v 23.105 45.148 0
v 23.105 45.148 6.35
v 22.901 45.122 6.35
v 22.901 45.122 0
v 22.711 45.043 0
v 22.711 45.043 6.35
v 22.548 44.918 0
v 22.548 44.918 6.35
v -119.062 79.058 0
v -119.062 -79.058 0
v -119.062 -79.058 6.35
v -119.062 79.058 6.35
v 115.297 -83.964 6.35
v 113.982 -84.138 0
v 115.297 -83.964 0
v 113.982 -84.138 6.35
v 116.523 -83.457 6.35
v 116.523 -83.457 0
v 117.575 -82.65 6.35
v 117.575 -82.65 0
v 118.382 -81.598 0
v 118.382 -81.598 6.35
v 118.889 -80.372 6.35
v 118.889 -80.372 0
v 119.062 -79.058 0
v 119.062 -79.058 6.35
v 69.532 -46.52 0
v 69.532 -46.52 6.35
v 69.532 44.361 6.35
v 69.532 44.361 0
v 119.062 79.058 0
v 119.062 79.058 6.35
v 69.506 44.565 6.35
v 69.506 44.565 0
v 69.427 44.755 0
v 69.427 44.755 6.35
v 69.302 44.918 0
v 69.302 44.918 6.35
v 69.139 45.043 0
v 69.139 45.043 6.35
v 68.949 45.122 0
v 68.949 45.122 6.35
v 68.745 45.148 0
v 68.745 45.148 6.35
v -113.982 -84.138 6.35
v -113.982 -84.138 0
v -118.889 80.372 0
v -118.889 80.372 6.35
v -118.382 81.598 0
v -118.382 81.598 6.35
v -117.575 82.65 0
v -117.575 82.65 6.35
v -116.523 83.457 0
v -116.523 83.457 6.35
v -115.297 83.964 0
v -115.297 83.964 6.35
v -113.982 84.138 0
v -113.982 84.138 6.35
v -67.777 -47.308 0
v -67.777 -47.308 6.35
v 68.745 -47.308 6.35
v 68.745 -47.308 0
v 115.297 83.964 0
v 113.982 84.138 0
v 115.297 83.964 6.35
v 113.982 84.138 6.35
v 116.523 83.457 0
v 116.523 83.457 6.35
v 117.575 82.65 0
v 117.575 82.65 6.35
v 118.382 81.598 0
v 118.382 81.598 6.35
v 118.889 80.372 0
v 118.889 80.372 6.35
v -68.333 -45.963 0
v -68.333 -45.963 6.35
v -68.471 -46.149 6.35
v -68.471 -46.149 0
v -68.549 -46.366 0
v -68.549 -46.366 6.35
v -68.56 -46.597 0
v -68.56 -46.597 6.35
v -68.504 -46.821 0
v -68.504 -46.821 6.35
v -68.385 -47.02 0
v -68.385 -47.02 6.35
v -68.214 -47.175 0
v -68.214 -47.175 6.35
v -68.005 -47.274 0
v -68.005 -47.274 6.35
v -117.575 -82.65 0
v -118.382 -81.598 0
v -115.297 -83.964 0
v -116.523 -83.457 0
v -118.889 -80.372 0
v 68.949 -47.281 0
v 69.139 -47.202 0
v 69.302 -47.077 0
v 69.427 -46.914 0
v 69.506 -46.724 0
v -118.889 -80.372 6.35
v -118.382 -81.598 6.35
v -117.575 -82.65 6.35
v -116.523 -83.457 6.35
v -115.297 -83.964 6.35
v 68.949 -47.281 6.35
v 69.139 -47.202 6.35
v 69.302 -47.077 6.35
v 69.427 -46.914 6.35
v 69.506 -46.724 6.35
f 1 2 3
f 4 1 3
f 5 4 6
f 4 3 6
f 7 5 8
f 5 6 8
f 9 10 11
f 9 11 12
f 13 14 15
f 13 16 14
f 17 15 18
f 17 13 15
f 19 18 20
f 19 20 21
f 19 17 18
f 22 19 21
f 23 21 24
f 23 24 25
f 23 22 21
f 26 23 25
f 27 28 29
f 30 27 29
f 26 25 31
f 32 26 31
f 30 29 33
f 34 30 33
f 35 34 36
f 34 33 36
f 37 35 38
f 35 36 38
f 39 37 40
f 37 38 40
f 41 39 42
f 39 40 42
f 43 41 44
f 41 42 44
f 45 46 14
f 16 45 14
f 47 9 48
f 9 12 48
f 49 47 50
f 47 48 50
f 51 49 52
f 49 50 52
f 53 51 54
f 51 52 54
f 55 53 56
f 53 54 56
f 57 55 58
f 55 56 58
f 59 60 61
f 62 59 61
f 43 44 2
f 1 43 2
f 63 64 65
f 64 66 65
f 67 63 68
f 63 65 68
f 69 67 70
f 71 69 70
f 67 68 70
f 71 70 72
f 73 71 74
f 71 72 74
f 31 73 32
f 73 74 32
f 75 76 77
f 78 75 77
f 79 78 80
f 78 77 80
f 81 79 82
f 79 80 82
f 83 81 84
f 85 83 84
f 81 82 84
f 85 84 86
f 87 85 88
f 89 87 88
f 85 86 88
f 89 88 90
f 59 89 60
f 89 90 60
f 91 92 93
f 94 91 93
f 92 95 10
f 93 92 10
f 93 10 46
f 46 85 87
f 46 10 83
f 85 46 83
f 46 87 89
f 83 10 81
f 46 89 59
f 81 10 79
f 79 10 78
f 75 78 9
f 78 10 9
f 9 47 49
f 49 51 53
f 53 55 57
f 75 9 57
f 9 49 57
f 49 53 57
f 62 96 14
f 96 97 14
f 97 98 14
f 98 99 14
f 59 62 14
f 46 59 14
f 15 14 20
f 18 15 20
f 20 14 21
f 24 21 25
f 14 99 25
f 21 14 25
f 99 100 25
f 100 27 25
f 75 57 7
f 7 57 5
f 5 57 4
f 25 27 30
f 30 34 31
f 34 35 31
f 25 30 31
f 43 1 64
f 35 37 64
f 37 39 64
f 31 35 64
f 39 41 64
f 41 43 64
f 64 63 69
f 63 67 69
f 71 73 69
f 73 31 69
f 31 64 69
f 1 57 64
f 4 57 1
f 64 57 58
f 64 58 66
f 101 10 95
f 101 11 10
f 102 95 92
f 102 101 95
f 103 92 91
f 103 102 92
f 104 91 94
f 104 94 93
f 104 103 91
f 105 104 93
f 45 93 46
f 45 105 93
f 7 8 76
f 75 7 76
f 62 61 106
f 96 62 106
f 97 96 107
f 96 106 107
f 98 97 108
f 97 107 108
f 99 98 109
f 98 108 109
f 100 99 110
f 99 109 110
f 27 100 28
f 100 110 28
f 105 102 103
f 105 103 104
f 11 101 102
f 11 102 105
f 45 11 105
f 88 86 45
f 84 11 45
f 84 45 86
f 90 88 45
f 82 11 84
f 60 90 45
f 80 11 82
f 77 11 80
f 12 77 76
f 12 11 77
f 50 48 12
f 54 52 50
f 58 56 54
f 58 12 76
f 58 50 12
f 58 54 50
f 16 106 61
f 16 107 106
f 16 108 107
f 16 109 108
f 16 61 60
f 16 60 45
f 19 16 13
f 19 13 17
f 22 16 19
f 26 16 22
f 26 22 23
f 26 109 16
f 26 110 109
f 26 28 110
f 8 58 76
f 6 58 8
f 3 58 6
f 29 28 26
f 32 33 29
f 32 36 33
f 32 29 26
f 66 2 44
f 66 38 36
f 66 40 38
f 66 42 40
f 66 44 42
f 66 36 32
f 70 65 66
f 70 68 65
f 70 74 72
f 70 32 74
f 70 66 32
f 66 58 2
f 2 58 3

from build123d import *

# Parameters (mm, degrees)
F0_W     = 238.125
F0_H     = 168.275
F1_DEPTH = 6.35
F3_DEPTH = 25.4
F4_R     = 5.08
F5_DEPTH = 6.351
F7_DEPTH = 6.351


with BuildPart() as f1:
    # F0 (on Top) → F1 (new body)
    with BuildSketch(Plane.XY):
        Rectangle(F0_W, F0_H)
    extrude(amount=F1_DEPTH)

    # F2 (on face) → F3 (cut)
    with BuildSketch(Plane.XY.offset(6.35)):
        Polygon((23.3045, 43.8785), (-66.6115, -46.0375), (68.2625, -46.0375), (68.2625, 43.8785), align=None)
    extrude(amount=-F3_DEPTH, mode=Mode.SUBTRACT)

    # F4
    f4_edges = [f1.edges().sort_by_distance(p)[0] for p in [
        (119.0625, -84.1375, 3.175),
        (119.0625, 84.1375, 3.175),
        (-119.0625, -84.1375, 3.175),
        (-119.0625, 84.1375, 3.175),
    ]]
    fillet(f4_edges, radius=F4_R)

    # F2 (on face) → F5 (cut, through all)
    with BuildSketch(Plane.XY.offset(6.35)):
        Polygon((23.3045, 43.8785), (-66.6115, -46.0375), (68.2625, -46.0375), (68.2625, 43.8785), align=None)
    extrude(amount=-F5_DEPTH, mode=Mode.SUBTRACT)

    # F6 (on face) → F7 (cut, through all)
    with BuildSketch(Plane.XY.offset(6.35)):
        with BuildLine():
            Line((68.7451, 45.1485), (23.104601, 45.1485))
            ThreePointArc((23.104601, 45.1485), (22.803276, 45.088563), (22.547825, 44.917876))
            Line((22.547825, 44.917876), (-68.333375, -45.963324))
            ThreePointArc((-68.333375, -45.963324), (-68.504062, -46.821425), (-67.776599, -47.3075))
            Line((-67.776599, -47.3075), (68.7451, -47.3075))
            ThreePointArc((68.7451, -47.3075), (69.301876, -47.076876), (69.5325, -46.5201))
            Line((69.5325, -46.5201), (69.5325, 44.3611))
            ThreePointArc((69.5325, 44.3611), (69.301876, 44.917876), (68.7451, 45.1485))
        make_face()
    extrude(amount=-F7_DEPTH, mode=Mode.SUBTRACT)


solid = f1.part
